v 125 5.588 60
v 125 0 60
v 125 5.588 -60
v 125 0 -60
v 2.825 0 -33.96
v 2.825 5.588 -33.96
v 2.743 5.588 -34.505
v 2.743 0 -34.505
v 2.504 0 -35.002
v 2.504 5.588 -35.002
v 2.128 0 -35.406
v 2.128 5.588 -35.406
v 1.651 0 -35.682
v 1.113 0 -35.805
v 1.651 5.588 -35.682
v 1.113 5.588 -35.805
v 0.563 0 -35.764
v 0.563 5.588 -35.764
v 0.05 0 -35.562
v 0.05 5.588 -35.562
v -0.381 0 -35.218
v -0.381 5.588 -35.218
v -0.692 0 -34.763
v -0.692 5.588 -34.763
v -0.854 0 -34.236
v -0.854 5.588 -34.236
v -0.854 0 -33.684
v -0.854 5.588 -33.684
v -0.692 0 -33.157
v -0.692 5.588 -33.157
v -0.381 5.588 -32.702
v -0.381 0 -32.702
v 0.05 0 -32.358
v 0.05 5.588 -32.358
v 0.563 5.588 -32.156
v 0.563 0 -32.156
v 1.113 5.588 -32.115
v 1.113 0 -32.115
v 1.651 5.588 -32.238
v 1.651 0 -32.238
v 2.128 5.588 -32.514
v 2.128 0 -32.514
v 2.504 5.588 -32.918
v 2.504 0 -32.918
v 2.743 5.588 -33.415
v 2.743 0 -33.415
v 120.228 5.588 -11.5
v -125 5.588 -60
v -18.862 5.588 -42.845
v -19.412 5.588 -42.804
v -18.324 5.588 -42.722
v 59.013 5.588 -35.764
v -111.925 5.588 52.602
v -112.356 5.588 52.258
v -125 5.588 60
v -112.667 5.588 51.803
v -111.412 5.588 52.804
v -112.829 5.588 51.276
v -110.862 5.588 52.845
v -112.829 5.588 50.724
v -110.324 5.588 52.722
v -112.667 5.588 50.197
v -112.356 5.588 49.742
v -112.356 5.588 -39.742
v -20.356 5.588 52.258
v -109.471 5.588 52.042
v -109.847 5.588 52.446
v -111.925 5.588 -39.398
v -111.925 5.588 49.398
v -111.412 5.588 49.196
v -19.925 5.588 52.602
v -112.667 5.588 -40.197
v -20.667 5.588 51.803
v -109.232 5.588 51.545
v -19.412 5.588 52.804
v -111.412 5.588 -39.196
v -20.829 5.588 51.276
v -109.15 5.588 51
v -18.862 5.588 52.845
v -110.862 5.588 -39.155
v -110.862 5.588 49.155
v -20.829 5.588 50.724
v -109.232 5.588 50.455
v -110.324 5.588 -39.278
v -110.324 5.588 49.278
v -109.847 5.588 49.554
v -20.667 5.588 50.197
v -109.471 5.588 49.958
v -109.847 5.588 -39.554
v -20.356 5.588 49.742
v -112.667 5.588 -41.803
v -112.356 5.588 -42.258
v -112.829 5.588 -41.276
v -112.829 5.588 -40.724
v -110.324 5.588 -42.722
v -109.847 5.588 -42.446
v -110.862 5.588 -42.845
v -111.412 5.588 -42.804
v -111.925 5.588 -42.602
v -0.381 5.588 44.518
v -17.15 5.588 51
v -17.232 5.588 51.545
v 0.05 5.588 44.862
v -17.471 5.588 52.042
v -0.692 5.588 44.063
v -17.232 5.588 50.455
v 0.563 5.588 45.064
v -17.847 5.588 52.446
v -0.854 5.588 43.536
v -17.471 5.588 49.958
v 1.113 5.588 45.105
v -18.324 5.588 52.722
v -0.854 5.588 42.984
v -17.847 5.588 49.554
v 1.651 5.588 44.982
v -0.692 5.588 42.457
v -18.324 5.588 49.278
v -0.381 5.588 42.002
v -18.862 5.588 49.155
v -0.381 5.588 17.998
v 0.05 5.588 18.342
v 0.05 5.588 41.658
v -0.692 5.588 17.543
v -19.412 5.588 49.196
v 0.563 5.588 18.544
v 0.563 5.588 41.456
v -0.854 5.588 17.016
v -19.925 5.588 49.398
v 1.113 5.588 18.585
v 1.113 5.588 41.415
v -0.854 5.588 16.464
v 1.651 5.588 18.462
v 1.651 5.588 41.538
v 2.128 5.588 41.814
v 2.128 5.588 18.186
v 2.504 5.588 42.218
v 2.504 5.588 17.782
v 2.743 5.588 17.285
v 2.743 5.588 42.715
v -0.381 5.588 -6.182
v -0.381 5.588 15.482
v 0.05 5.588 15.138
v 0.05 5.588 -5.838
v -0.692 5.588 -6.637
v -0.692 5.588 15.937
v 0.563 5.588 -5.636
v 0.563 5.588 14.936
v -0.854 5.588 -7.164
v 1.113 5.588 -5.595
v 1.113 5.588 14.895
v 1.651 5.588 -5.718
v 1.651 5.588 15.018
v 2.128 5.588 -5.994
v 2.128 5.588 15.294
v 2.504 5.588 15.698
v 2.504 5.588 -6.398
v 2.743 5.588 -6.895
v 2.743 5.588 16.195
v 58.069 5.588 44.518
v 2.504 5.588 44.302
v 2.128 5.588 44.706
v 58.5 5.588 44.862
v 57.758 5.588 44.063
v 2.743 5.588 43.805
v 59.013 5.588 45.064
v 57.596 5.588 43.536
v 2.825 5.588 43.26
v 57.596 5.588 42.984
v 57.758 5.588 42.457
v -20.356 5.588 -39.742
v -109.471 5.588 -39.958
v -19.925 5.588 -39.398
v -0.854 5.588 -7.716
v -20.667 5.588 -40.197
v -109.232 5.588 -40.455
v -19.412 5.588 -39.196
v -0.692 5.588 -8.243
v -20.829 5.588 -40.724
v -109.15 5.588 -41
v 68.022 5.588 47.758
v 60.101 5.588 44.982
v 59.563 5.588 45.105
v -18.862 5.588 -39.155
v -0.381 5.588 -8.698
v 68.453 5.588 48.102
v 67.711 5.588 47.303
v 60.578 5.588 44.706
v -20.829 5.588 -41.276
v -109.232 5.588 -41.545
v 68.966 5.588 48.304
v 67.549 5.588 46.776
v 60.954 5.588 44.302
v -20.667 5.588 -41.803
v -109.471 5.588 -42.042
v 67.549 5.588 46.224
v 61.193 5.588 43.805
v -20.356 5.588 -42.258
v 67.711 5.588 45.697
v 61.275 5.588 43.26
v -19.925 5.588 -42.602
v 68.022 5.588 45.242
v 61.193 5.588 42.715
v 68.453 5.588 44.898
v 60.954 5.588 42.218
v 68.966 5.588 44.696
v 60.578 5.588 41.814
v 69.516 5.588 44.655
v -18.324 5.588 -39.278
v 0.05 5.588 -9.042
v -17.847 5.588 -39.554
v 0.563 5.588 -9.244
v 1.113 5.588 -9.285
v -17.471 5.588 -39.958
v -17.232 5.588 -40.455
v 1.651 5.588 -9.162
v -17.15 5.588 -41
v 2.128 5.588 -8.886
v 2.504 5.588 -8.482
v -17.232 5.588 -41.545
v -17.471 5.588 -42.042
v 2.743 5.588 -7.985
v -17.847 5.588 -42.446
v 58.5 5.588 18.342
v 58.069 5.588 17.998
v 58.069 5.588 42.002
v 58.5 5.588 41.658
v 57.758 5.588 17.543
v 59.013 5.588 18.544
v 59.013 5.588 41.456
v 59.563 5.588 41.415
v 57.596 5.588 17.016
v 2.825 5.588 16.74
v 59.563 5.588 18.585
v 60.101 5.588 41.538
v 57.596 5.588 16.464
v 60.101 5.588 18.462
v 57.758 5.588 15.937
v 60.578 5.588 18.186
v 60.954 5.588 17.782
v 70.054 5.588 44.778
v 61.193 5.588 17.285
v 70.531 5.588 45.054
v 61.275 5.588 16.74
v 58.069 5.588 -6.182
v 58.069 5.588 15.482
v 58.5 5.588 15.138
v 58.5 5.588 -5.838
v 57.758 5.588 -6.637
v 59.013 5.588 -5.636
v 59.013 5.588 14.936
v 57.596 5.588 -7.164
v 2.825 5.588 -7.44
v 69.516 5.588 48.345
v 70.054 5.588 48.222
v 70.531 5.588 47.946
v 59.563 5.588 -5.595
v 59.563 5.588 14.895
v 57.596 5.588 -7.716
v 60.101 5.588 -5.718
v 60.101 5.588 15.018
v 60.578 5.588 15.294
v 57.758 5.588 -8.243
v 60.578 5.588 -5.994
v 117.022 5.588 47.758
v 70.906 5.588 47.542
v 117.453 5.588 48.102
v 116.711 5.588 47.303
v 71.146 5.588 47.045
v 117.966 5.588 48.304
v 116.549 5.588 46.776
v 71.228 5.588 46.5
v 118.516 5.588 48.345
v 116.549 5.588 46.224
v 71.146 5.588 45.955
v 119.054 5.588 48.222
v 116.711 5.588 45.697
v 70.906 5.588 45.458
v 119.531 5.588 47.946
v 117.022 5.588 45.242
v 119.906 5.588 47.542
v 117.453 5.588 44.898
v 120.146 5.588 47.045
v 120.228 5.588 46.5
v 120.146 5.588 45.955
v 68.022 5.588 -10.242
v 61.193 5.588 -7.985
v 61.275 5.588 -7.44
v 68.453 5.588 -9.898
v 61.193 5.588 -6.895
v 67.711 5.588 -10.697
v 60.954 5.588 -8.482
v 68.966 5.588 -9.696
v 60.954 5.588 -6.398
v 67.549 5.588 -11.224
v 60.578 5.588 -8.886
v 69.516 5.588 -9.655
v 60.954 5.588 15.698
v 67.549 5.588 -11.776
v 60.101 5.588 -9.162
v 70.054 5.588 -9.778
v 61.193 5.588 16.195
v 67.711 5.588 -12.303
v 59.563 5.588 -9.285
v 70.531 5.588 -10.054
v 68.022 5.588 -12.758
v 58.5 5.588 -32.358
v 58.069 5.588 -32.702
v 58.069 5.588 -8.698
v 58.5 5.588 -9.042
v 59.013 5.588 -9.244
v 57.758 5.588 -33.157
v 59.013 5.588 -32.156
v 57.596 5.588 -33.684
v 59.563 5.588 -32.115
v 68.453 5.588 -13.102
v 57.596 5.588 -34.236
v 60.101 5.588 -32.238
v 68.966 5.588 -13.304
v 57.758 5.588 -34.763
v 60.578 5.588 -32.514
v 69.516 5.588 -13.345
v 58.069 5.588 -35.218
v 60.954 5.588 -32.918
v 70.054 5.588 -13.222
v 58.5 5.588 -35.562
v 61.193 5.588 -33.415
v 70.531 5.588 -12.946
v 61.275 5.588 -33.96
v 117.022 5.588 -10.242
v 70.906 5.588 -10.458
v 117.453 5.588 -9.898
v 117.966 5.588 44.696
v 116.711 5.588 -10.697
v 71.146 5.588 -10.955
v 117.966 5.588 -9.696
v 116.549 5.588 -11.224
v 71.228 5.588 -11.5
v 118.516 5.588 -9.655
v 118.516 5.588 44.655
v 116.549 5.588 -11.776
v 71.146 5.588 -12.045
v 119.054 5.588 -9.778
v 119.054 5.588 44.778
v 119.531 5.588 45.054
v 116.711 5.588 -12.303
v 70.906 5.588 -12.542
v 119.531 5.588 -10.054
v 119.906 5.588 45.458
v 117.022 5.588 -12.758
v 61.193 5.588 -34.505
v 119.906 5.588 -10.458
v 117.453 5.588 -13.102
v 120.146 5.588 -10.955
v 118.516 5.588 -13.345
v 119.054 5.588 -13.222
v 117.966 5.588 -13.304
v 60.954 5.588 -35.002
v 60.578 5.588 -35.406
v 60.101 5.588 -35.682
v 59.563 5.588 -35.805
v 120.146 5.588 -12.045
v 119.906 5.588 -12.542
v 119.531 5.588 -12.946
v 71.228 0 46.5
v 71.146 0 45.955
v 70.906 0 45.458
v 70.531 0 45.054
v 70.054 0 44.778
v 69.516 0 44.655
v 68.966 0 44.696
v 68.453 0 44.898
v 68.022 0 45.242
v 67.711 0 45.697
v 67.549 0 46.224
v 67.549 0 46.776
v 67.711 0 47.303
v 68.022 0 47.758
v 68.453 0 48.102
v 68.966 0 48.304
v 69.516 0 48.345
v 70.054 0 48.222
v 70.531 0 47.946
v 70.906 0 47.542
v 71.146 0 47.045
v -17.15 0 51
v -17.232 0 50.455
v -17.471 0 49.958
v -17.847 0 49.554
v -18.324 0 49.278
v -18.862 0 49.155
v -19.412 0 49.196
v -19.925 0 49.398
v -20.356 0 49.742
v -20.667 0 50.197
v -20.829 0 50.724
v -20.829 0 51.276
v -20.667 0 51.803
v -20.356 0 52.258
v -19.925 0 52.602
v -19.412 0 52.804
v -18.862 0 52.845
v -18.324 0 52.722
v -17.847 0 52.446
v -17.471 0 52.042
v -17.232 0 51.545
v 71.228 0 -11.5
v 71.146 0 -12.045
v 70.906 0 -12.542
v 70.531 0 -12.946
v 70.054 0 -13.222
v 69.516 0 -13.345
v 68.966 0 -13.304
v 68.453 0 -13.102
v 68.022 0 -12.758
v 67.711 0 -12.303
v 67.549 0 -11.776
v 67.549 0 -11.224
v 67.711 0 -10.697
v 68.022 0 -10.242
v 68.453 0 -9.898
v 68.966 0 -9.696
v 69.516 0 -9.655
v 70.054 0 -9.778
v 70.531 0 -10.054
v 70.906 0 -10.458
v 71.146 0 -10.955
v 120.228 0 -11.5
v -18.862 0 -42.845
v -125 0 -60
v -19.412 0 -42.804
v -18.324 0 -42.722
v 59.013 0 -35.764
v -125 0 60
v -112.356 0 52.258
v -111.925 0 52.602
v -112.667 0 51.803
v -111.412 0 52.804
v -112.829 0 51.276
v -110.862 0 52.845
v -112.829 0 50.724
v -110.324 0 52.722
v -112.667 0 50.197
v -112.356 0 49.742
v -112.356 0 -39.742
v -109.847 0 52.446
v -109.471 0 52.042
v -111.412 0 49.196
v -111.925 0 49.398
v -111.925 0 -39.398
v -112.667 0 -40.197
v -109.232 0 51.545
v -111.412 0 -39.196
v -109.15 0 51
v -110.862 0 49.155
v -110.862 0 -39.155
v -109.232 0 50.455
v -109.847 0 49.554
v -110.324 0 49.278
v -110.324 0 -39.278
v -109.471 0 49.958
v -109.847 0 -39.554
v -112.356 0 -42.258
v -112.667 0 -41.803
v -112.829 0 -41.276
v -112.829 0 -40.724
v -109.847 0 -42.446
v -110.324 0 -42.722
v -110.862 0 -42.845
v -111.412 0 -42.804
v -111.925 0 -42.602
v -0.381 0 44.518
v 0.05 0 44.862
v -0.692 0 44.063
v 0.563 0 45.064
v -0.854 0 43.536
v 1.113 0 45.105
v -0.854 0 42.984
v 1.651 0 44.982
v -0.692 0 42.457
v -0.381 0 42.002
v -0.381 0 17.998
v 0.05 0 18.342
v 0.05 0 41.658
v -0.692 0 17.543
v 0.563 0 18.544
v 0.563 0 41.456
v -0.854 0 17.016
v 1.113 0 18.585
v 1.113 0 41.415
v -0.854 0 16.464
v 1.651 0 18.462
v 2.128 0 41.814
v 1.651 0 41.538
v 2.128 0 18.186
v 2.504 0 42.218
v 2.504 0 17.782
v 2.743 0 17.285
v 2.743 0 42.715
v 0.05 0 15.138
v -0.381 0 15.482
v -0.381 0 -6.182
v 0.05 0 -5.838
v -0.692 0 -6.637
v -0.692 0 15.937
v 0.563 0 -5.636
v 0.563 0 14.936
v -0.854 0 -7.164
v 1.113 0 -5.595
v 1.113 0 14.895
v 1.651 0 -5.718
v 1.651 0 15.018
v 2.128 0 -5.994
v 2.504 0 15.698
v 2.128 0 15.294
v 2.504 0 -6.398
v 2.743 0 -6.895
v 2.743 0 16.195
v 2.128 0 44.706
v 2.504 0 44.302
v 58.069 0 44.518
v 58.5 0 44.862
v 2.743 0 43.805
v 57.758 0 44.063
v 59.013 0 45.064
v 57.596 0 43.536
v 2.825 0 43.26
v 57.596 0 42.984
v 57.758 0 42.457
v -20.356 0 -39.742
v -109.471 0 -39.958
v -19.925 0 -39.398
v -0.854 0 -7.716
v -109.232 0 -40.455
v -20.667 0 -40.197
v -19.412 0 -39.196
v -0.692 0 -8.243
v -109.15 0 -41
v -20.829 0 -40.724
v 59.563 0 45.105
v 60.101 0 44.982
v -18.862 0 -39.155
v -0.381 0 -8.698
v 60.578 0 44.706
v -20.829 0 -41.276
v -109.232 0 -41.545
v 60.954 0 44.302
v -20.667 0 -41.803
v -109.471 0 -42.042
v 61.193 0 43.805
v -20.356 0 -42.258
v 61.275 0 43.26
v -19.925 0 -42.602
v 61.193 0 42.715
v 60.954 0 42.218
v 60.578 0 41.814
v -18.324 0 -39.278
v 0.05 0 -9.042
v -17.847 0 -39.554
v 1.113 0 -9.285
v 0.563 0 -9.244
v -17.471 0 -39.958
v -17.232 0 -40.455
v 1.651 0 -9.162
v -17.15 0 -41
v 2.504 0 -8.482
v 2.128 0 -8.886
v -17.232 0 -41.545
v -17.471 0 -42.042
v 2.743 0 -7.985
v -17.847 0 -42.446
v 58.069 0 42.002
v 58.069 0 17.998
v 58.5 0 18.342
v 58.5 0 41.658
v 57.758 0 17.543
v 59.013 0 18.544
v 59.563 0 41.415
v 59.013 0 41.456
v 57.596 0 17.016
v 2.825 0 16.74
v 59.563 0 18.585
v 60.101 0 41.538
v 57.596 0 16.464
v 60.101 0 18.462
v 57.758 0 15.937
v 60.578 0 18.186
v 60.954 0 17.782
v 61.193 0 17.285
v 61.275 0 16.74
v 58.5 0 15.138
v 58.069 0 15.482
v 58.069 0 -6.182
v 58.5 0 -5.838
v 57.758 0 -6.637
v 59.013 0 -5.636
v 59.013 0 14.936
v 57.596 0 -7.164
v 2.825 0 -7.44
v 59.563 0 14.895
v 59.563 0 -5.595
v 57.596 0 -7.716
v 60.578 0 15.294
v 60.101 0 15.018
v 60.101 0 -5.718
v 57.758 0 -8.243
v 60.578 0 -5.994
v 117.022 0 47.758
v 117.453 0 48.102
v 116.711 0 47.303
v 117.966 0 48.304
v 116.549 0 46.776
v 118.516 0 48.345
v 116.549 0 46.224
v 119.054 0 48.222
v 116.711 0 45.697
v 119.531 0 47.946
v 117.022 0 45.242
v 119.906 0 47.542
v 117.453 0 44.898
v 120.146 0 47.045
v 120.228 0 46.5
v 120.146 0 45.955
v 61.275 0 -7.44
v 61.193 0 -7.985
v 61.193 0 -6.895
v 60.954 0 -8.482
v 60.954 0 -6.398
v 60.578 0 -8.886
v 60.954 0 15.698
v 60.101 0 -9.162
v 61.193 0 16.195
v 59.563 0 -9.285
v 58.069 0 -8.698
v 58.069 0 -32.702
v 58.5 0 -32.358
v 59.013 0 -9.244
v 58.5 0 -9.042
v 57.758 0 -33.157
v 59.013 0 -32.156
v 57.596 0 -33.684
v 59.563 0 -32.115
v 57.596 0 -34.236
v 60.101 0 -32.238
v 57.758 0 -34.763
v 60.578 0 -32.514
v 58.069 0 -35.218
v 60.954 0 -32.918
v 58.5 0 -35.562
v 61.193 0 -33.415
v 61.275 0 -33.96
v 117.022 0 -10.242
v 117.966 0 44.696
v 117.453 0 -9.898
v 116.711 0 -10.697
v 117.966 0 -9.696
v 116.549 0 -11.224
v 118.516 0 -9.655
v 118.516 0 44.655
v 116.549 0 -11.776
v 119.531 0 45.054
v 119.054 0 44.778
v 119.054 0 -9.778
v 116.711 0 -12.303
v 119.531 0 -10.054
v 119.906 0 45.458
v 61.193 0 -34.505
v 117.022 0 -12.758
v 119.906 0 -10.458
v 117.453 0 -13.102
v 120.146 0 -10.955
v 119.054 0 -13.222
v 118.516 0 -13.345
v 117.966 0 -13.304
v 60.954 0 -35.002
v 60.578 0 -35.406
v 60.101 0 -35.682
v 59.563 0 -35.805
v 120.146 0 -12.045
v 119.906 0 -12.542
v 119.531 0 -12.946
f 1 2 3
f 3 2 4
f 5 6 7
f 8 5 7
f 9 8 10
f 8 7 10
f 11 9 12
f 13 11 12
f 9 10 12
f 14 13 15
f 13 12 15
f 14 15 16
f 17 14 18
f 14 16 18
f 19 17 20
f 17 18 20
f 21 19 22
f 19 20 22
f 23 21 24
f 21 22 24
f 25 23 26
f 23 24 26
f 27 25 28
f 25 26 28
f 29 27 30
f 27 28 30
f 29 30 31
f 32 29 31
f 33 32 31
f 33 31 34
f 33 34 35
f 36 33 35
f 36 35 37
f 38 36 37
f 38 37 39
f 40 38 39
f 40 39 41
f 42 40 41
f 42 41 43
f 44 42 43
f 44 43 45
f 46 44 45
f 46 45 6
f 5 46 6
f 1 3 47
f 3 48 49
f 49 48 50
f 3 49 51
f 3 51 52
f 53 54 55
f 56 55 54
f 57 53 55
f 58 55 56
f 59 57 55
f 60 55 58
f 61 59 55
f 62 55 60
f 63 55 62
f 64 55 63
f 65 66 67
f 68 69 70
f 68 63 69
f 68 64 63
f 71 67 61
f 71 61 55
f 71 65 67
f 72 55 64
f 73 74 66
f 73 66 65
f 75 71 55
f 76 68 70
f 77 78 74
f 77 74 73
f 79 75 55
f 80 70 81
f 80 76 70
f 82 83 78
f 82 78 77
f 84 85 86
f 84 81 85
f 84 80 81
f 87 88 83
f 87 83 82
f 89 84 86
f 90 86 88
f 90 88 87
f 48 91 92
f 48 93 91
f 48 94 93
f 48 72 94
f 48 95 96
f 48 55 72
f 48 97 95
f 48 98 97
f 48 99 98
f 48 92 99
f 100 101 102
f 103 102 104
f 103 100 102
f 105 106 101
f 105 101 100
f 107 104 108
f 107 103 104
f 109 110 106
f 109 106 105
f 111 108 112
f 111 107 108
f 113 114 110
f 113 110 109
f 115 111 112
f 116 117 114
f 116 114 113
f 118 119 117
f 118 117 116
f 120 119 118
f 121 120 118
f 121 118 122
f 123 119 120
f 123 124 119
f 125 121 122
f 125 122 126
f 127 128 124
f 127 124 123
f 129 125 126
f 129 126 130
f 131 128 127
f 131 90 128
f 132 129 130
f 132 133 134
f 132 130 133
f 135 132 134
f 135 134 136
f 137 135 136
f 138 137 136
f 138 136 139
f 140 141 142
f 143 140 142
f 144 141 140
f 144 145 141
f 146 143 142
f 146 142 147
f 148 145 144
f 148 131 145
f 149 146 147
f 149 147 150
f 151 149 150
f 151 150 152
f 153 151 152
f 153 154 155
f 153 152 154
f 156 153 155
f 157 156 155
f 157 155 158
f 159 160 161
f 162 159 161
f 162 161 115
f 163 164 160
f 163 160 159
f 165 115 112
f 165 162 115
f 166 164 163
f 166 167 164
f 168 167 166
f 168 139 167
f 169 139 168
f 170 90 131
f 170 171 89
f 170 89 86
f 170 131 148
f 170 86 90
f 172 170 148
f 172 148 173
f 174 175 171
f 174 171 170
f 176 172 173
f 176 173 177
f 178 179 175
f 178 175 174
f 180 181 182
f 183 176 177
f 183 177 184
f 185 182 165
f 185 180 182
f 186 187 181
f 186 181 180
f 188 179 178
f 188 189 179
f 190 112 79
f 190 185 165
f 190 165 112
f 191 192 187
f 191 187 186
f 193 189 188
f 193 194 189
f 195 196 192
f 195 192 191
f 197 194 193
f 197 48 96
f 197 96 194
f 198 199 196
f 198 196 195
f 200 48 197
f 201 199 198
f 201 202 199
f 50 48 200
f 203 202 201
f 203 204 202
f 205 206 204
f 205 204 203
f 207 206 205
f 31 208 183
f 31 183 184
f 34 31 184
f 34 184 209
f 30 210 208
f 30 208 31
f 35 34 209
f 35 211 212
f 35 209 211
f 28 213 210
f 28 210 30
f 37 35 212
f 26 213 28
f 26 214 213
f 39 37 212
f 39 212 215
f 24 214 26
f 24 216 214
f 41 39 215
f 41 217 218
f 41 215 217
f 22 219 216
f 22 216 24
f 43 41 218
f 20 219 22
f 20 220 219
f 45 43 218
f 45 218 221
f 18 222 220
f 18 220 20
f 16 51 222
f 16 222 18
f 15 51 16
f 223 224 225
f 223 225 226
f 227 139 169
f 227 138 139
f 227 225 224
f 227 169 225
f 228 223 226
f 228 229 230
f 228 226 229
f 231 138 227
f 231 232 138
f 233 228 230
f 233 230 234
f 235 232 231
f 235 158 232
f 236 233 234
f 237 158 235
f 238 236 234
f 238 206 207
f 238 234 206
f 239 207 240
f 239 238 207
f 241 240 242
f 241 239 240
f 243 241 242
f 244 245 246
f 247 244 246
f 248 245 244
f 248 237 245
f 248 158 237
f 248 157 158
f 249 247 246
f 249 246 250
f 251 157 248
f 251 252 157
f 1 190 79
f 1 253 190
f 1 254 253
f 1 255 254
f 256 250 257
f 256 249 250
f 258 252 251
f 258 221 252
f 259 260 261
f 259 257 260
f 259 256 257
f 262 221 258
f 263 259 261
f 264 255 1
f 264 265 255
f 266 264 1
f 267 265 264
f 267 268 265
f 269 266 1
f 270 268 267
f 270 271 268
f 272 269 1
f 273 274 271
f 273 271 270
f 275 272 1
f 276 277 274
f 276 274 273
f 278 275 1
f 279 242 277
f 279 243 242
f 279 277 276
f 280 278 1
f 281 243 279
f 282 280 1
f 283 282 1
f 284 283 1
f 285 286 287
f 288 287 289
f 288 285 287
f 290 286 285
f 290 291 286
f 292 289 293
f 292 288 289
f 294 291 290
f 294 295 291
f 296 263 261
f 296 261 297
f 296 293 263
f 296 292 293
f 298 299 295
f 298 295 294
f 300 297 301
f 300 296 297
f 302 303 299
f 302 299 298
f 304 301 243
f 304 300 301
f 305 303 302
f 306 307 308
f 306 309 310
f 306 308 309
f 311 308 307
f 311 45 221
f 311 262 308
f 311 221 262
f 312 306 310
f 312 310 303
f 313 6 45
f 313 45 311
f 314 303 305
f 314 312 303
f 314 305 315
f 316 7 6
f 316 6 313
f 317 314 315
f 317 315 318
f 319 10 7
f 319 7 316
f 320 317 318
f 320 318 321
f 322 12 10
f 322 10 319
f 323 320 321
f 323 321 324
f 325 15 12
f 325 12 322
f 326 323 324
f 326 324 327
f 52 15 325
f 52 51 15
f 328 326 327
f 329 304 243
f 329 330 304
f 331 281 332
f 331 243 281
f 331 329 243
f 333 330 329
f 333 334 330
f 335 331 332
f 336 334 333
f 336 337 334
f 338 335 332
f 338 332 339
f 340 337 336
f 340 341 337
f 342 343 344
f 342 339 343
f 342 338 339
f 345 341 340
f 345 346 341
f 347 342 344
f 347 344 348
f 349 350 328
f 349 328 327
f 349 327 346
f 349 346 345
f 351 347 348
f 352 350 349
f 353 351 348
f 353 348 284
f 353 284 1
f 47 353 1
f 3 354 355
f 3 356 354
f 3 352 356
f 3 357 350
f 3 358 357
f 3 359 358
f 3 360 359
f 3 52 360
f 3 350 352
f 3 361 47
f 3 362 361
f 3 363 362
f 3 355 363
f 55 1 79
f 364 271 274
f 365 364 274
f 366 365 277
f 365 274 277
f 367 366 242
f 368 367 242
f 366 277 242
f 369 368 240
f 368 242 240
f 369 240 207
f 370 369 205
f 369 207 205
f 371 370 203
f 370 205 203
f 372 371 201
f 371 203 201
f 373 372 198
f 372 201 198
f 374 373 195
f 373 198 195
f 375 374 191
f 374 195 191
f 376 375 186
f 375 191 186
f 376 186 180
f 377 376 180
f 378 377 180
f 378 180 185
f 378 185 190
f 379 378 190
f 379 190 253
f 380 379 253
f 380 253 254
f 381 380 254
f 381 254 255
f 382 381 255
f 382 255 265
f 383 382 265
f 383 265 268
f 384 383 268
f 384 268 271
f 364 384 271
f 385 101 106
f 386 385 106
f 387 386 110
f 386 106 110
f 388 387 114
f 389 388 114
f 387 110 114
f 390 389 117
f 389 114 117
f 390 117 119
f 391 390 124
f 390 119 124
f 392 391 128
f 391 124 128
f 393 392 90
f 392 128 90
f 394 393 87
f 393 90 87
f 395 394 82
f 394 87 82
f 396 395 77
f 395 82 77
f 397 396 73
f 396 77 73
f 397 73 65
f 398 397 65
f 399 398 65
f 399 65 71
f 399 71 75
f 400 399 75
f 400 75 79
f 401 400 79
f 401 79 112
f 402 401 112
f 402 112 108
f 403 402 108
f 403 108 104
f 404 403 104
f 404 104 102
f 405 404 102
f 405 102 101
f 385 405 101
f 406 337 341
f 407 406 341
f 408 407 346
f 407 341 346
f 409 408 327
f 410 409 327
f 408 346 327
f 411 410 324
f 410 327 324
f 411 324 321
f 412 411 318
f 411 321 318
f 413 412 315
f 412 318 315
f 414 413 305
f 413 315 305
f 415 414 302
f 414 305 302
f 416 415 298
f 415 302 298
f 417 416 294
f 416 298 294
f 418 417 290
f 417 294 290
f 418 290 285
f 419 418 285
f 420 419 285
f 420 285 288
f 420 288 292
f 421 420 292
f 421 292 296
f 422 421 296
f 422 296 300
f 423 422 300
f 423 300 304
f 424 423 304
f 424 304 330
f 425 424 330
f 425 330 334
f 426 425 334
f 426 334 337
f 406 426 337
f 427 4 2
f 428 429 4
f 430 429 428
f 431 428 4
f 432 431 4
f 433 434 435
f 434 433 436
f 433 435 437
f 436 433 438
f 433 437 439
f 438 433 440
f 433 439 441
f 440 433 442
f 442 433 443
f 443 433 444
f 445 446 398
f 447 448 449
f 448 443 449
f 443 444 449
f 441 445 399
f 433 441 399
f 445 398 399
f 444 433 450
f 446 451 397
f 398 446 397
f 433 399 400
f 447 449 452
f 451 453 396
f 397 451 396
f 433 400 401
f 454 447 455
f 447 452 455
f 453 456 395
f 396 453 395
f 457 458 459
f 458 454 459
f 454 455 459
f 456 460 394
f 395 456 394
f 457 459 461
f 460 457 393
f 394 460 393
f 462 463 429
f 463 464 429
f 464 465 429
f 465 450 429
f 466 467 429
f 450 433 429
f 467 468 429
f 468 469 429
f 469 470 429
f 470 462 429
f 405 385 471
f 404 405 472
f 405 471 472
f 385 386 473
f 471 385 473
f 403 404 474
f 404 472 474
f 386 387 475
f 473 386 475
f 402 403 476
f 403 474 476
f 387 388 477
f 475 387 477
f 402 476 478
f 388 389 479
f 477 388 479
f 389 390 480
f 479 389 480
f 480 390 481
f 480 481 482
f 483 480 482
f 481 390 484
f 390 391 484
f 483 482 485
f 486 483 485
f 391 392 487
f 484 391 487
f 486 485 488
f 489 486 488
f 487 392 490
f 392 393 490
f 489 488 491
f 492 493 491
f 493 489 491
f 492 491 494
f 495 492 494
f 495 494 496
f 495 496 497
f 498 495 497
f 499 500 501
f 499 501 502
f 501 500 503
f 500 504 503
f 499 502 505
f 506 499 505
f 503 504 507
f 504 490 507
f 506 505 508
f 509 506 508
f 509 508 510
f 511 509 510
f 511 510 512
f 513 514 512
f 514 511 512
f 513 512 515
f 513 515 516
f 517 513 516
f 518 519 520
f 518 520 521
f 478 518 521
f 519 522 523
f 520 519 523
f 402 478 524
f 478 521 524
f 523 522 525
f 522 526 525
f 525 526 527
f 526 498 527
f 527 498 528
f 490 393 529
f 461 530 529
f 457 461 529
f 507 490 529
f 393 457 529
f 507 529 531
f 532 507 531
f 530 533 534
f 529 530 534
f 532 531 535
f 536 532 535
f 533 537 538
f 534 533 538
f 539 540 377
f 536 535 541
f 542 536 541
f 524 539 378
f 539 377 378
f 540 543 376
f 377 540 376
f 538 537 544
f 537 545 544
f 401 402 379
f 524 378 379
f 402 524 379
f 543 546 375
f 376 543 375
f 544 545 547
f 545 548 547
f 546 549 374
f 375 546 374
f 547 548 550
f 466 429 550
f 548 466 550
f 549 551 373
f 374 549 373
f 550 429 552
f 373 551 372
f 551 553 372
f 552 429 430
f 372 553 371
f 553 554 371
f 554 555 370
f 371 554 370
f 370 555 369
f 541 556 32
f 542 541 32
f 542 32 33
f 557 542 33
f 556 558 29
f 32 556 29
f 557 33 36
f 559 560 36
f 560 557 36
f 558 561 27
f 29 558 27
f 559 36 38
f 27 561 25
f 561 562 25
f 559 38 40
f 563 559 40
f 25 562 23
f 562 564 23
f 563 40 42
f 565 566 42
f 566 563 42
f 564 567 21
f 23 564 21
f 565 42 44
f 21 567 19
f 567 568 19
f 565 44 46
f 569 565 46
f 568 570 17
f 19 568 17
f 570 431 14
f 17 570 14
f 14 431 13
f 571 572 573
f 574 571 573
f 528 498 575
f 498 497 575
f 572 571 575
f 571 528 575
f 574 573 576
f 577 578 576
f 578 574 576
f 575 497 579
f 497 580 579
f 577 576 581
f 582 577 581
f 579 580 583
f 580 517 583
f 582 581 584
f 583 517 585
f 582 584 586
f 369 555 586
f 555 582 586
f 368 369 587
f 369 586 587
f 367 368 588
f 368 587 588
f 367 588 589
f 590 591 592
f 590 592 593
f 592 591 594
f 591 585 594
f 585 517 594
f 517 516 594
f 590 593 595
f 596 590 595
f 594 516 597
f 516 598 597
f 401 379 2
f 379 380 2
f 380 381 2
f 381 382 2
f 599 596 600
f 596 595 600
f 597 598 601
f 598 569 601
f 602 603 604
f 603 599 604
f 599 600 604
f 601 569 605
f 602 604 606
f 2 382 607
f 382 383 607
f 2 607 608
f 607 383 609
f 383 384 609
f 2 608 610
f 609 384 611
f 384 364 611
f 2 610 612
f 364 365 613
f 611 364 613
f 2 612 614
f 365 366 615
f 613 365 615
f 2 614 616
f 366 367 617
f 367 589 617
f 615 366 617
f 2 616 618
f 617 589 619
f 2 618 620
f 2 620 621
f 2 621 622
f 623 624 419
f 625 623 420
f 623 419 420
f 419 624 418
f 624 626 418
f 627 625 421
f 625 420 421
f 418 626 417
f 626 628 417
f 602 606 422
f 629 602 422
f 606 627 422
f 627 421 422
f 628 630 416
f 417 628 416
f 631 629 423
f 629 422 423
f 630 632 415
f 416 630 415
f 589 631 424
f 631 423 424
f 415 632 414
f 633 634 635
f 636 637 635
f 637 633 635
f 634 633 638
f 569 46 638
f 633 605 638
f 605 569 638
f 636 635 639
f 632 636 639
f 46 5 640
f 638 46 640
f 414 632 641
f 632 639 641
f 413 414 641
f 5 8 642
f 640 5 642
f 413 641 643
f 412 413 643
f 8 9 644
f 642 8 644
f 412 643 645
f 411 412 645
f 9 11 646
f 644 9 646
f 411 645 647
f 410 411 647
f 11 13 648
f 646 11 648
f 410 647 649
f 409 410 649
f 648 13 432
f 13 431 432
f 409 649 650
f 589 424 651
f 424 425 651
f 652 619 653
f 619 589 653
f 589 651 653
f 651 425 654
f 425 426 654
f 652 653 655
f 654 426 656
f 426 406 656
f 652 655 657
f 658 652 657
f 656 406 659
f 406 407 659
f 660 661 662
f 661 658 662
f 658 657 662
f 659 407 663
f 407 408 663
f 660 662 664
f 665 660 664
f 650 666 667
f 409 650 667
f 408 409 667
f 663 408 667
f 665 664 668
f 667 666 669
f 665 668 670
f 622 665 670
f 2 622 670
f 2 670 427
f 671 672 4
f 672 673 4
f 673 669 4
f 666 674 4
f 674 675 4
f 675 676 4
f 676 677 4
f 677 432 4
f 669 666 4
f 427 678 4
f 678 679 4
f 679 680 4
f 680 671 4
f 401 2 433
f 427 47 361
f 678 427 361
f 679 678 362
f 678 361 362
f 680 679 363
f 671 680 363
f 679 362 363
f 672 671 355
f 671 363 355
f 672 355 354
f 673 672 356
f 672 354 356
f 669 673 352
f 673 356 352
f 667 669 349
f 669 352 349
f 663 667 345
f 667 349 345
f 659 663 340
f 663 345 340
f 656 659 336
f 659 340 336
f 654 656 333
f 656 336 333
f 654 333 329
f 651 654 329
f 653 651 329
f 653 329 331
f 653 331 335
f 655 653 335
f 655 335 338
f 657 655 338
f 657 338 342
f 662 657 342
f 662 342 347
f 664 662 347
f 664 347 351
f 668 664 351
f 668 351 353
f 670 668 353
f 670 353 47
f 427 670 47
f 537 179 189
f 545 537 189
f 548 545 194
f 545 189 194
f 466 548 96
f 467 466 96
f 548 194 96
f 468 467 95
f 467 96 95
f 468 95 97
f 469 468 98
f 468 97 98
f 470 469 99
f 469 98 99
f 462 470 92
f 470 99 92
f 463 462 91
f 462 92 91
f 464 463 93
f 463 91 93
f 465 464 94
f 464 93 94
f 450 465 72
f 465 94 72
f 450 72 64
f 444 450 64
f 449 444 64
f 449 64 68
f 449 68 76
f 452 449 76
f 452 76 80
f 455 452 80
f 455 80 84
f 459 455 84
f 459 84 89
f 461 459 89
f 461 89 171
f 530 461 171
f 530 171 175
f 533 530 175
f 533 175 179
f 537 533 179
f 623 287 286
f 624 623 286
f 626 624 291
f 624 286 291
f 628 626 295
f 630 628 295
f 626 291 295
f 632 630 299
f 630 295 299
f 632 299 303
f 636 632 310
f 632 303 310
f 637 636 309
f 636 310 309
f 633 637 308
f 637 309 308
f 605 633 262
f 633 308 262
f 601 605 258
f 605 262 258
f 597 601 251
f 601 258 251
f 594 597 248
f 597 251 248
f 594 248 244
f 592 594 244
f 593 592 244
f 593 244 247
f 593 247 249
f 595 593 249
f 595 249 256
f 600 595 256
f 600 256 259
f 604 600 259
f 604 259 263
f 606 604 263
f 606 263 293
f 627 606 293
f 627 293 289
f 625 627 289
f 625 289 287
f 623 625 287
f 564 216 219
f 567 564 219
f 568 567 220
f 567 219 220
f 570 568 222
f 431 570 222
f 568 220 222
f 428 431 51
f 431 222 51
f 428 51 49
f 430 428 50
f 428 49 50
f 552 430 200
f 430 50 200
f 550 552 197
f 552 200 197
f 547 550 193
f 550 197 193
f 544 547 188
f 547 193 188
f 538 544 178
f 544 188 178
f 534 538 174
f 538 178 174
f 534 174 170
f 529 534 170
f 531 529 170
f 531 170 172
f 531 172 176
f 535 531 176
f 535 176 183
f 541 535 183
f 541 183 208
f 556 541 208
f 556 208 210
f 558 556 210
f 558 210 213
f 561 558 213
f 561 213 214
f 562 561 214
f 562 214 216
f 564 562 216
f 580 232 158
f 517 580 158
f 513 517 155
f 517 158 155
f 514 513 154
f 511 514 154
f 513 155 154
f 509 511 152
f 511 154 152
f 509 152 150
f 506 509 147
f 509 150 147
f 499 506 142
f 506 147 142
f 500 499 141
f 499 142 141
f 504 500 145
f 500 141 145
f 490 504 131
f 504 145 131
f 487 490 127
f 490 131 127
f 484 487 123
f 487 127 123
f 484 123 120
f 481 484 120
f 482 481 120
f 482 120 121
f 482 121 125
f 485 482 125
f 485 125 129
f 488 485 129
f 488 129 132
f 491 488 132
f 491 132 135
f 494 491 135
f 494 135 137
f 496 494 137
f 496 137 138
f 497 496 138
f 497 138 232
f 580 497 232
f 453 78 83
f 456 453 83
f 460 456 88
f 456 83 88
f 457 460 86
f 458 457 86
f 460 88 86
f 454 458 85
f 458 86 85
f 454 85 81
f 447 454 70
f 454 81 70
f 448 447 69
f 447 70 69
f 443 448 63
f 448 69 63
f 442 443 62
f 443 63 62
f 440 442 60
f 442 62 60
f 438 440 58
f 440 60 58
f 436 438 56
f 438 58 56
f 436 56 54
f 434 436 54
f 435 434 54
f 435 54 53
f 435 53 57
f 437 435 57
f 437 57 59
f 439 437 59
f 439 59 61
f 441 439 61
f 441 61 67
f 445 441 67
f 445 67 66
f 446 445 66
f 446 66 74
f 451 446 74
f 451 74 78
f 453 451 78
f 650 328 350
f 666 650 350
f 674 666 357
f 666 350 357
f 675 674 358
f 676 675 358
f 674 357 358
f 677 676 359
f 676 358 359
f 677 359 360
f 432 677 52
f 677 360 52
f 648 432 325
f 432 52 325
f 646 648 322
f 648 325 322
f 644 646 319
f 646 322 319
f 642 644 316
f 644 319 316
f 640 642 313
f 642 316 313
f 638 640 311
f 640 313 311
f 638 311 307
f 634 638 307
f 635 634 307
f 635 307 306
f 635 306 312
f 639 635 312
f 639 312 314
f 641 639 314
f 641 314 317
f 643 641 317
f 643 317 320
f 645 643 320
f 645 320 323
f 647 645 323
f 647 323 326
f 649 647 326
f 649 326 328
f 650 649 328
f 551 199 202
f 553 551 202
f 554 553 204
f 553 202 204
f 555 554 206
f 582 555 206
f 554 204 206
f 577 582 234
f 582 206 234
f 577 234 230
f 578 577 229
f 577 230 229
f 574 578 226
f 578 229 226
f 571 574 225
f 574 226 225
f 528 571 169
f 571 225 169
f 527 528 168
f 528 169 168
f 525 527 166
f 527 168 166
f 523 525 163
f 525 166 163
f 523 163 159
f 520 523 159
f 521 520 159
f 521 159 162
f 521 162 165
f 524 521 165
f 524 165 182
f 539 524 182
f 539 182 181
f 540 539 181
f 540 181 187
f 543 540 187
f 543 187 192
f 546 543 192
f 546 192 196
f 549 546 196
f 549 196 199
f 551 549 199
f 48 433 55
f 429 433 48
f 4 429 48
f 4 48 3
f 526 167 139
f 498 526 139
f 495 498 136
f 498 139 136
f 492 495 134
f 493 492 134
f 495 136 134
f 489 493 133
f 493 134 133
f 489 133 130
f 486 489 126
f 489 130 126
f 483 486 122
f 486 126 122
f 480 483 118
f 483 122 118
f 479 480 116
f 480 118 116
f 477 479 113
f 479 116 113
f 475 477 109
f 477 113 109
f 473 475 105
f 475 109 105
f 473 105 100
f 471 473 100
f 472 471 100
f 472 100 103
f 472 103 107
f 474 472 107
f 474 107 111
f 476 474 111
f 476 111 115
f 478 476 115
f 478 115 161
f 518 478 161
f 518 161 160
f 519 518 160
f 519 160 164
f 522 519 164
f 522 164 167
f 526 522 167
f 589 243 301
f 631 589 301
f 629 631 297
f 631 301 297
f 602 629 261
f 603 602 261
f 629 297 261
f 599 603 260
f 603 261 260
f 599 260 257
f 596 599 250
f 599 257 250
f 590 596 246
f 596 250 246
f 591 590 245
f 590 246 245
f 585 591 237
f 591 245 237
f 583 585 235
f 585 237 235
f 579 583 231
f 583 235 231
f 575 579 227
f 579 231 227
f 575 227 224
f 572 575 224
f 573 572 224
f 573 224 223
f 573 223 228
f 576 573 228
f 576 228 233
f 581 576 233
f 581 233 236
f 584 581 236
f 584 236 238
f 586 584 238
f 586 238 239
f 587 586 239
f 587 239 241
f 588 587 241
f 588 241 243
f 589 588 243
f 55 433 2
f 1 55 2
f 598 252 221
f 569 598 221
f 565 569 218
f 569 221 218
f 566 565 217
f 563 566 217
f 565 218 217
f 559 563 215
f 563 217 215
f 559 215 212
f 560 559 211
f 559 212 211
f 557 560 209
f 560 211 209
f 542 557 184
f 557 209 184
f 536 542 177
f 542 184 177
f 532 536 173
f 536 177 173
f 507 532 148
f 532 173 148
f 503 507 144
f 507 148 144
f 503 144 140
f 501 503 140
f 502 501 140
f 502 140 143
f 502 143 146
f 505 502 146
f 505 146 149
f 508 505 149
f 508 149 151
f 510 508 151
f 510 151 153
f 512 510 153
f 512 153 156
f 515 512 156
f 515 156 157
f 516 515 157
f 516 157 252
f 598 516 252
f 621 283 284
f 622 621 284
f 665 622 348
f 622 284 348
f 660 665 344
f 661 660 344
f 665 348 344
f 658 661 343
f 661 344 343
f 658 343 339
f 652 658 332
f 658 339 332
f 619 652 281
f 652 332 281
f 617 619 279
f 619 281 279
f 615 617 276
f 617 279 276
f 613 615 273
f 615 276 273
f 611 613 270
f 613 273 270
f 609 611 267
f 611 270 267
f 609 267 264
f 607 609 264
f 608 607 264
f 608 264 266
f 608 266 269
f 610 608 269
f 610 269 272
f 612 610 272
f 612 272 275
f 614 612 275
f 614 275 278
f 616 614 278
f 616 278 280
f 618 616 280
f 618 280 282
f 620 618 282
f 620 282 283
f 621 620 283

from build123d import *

# Parameters (mm, degrees)
SKETCH1_W                       = 250
SKETCH1_H                       = 120
BOSS_EXTRUDE1_DEPTH             = 5.588
F_3_0MM_CLEARANCE_DOWEL_HOLE2_D = 3.7


with BuildPart() as part:
    # Sketch1 → Boss-Extrude1 (new body)
    with BuildSketch(Plane(origin=(0, 0, 0), x_dir=(1, 0, 0), z_dir=(0, 1, 0))):
        Rectangle(SKETCH1_W, SKETCH1_H)
    extrude(amount=BOSS_EXTRUDE1_DEPTH)

    # Ø3.0mm Clearance Dowel Hole2 (through all)
    with Locations(Plane(origin=(-44.960960081, 0, -163.688232646), x_dir=(-1, 0, 0), z_dir=(0, -1, 0))):
        with Locations((-45.935960081, -156.248232646), (-25.960960081, -122.688232646), (-45.935960081, -129.728232646), (-45.935960081, -180.428232646), (-45.935960081, -206.948232646), (-25.960960081, -214.688232646), (66.039039919, -214.688232646), (-104.385960081, -206.948232646), (-104.385960081, -180.428232646), (-104.385960081, -156.248232646), (-104.385960081, -129.728232646), (-163.338823355, -210.188232646), (-163.338823355, -152.188232646), (-114.338823355, -152.188232646), (-114.338823355, -210.188232646), (66.039039919, -122.688232646)):
            Hole(F_3_0MM_CLEARANCE_DOWEL_HOLE2_D / 2)


solid = part.part
